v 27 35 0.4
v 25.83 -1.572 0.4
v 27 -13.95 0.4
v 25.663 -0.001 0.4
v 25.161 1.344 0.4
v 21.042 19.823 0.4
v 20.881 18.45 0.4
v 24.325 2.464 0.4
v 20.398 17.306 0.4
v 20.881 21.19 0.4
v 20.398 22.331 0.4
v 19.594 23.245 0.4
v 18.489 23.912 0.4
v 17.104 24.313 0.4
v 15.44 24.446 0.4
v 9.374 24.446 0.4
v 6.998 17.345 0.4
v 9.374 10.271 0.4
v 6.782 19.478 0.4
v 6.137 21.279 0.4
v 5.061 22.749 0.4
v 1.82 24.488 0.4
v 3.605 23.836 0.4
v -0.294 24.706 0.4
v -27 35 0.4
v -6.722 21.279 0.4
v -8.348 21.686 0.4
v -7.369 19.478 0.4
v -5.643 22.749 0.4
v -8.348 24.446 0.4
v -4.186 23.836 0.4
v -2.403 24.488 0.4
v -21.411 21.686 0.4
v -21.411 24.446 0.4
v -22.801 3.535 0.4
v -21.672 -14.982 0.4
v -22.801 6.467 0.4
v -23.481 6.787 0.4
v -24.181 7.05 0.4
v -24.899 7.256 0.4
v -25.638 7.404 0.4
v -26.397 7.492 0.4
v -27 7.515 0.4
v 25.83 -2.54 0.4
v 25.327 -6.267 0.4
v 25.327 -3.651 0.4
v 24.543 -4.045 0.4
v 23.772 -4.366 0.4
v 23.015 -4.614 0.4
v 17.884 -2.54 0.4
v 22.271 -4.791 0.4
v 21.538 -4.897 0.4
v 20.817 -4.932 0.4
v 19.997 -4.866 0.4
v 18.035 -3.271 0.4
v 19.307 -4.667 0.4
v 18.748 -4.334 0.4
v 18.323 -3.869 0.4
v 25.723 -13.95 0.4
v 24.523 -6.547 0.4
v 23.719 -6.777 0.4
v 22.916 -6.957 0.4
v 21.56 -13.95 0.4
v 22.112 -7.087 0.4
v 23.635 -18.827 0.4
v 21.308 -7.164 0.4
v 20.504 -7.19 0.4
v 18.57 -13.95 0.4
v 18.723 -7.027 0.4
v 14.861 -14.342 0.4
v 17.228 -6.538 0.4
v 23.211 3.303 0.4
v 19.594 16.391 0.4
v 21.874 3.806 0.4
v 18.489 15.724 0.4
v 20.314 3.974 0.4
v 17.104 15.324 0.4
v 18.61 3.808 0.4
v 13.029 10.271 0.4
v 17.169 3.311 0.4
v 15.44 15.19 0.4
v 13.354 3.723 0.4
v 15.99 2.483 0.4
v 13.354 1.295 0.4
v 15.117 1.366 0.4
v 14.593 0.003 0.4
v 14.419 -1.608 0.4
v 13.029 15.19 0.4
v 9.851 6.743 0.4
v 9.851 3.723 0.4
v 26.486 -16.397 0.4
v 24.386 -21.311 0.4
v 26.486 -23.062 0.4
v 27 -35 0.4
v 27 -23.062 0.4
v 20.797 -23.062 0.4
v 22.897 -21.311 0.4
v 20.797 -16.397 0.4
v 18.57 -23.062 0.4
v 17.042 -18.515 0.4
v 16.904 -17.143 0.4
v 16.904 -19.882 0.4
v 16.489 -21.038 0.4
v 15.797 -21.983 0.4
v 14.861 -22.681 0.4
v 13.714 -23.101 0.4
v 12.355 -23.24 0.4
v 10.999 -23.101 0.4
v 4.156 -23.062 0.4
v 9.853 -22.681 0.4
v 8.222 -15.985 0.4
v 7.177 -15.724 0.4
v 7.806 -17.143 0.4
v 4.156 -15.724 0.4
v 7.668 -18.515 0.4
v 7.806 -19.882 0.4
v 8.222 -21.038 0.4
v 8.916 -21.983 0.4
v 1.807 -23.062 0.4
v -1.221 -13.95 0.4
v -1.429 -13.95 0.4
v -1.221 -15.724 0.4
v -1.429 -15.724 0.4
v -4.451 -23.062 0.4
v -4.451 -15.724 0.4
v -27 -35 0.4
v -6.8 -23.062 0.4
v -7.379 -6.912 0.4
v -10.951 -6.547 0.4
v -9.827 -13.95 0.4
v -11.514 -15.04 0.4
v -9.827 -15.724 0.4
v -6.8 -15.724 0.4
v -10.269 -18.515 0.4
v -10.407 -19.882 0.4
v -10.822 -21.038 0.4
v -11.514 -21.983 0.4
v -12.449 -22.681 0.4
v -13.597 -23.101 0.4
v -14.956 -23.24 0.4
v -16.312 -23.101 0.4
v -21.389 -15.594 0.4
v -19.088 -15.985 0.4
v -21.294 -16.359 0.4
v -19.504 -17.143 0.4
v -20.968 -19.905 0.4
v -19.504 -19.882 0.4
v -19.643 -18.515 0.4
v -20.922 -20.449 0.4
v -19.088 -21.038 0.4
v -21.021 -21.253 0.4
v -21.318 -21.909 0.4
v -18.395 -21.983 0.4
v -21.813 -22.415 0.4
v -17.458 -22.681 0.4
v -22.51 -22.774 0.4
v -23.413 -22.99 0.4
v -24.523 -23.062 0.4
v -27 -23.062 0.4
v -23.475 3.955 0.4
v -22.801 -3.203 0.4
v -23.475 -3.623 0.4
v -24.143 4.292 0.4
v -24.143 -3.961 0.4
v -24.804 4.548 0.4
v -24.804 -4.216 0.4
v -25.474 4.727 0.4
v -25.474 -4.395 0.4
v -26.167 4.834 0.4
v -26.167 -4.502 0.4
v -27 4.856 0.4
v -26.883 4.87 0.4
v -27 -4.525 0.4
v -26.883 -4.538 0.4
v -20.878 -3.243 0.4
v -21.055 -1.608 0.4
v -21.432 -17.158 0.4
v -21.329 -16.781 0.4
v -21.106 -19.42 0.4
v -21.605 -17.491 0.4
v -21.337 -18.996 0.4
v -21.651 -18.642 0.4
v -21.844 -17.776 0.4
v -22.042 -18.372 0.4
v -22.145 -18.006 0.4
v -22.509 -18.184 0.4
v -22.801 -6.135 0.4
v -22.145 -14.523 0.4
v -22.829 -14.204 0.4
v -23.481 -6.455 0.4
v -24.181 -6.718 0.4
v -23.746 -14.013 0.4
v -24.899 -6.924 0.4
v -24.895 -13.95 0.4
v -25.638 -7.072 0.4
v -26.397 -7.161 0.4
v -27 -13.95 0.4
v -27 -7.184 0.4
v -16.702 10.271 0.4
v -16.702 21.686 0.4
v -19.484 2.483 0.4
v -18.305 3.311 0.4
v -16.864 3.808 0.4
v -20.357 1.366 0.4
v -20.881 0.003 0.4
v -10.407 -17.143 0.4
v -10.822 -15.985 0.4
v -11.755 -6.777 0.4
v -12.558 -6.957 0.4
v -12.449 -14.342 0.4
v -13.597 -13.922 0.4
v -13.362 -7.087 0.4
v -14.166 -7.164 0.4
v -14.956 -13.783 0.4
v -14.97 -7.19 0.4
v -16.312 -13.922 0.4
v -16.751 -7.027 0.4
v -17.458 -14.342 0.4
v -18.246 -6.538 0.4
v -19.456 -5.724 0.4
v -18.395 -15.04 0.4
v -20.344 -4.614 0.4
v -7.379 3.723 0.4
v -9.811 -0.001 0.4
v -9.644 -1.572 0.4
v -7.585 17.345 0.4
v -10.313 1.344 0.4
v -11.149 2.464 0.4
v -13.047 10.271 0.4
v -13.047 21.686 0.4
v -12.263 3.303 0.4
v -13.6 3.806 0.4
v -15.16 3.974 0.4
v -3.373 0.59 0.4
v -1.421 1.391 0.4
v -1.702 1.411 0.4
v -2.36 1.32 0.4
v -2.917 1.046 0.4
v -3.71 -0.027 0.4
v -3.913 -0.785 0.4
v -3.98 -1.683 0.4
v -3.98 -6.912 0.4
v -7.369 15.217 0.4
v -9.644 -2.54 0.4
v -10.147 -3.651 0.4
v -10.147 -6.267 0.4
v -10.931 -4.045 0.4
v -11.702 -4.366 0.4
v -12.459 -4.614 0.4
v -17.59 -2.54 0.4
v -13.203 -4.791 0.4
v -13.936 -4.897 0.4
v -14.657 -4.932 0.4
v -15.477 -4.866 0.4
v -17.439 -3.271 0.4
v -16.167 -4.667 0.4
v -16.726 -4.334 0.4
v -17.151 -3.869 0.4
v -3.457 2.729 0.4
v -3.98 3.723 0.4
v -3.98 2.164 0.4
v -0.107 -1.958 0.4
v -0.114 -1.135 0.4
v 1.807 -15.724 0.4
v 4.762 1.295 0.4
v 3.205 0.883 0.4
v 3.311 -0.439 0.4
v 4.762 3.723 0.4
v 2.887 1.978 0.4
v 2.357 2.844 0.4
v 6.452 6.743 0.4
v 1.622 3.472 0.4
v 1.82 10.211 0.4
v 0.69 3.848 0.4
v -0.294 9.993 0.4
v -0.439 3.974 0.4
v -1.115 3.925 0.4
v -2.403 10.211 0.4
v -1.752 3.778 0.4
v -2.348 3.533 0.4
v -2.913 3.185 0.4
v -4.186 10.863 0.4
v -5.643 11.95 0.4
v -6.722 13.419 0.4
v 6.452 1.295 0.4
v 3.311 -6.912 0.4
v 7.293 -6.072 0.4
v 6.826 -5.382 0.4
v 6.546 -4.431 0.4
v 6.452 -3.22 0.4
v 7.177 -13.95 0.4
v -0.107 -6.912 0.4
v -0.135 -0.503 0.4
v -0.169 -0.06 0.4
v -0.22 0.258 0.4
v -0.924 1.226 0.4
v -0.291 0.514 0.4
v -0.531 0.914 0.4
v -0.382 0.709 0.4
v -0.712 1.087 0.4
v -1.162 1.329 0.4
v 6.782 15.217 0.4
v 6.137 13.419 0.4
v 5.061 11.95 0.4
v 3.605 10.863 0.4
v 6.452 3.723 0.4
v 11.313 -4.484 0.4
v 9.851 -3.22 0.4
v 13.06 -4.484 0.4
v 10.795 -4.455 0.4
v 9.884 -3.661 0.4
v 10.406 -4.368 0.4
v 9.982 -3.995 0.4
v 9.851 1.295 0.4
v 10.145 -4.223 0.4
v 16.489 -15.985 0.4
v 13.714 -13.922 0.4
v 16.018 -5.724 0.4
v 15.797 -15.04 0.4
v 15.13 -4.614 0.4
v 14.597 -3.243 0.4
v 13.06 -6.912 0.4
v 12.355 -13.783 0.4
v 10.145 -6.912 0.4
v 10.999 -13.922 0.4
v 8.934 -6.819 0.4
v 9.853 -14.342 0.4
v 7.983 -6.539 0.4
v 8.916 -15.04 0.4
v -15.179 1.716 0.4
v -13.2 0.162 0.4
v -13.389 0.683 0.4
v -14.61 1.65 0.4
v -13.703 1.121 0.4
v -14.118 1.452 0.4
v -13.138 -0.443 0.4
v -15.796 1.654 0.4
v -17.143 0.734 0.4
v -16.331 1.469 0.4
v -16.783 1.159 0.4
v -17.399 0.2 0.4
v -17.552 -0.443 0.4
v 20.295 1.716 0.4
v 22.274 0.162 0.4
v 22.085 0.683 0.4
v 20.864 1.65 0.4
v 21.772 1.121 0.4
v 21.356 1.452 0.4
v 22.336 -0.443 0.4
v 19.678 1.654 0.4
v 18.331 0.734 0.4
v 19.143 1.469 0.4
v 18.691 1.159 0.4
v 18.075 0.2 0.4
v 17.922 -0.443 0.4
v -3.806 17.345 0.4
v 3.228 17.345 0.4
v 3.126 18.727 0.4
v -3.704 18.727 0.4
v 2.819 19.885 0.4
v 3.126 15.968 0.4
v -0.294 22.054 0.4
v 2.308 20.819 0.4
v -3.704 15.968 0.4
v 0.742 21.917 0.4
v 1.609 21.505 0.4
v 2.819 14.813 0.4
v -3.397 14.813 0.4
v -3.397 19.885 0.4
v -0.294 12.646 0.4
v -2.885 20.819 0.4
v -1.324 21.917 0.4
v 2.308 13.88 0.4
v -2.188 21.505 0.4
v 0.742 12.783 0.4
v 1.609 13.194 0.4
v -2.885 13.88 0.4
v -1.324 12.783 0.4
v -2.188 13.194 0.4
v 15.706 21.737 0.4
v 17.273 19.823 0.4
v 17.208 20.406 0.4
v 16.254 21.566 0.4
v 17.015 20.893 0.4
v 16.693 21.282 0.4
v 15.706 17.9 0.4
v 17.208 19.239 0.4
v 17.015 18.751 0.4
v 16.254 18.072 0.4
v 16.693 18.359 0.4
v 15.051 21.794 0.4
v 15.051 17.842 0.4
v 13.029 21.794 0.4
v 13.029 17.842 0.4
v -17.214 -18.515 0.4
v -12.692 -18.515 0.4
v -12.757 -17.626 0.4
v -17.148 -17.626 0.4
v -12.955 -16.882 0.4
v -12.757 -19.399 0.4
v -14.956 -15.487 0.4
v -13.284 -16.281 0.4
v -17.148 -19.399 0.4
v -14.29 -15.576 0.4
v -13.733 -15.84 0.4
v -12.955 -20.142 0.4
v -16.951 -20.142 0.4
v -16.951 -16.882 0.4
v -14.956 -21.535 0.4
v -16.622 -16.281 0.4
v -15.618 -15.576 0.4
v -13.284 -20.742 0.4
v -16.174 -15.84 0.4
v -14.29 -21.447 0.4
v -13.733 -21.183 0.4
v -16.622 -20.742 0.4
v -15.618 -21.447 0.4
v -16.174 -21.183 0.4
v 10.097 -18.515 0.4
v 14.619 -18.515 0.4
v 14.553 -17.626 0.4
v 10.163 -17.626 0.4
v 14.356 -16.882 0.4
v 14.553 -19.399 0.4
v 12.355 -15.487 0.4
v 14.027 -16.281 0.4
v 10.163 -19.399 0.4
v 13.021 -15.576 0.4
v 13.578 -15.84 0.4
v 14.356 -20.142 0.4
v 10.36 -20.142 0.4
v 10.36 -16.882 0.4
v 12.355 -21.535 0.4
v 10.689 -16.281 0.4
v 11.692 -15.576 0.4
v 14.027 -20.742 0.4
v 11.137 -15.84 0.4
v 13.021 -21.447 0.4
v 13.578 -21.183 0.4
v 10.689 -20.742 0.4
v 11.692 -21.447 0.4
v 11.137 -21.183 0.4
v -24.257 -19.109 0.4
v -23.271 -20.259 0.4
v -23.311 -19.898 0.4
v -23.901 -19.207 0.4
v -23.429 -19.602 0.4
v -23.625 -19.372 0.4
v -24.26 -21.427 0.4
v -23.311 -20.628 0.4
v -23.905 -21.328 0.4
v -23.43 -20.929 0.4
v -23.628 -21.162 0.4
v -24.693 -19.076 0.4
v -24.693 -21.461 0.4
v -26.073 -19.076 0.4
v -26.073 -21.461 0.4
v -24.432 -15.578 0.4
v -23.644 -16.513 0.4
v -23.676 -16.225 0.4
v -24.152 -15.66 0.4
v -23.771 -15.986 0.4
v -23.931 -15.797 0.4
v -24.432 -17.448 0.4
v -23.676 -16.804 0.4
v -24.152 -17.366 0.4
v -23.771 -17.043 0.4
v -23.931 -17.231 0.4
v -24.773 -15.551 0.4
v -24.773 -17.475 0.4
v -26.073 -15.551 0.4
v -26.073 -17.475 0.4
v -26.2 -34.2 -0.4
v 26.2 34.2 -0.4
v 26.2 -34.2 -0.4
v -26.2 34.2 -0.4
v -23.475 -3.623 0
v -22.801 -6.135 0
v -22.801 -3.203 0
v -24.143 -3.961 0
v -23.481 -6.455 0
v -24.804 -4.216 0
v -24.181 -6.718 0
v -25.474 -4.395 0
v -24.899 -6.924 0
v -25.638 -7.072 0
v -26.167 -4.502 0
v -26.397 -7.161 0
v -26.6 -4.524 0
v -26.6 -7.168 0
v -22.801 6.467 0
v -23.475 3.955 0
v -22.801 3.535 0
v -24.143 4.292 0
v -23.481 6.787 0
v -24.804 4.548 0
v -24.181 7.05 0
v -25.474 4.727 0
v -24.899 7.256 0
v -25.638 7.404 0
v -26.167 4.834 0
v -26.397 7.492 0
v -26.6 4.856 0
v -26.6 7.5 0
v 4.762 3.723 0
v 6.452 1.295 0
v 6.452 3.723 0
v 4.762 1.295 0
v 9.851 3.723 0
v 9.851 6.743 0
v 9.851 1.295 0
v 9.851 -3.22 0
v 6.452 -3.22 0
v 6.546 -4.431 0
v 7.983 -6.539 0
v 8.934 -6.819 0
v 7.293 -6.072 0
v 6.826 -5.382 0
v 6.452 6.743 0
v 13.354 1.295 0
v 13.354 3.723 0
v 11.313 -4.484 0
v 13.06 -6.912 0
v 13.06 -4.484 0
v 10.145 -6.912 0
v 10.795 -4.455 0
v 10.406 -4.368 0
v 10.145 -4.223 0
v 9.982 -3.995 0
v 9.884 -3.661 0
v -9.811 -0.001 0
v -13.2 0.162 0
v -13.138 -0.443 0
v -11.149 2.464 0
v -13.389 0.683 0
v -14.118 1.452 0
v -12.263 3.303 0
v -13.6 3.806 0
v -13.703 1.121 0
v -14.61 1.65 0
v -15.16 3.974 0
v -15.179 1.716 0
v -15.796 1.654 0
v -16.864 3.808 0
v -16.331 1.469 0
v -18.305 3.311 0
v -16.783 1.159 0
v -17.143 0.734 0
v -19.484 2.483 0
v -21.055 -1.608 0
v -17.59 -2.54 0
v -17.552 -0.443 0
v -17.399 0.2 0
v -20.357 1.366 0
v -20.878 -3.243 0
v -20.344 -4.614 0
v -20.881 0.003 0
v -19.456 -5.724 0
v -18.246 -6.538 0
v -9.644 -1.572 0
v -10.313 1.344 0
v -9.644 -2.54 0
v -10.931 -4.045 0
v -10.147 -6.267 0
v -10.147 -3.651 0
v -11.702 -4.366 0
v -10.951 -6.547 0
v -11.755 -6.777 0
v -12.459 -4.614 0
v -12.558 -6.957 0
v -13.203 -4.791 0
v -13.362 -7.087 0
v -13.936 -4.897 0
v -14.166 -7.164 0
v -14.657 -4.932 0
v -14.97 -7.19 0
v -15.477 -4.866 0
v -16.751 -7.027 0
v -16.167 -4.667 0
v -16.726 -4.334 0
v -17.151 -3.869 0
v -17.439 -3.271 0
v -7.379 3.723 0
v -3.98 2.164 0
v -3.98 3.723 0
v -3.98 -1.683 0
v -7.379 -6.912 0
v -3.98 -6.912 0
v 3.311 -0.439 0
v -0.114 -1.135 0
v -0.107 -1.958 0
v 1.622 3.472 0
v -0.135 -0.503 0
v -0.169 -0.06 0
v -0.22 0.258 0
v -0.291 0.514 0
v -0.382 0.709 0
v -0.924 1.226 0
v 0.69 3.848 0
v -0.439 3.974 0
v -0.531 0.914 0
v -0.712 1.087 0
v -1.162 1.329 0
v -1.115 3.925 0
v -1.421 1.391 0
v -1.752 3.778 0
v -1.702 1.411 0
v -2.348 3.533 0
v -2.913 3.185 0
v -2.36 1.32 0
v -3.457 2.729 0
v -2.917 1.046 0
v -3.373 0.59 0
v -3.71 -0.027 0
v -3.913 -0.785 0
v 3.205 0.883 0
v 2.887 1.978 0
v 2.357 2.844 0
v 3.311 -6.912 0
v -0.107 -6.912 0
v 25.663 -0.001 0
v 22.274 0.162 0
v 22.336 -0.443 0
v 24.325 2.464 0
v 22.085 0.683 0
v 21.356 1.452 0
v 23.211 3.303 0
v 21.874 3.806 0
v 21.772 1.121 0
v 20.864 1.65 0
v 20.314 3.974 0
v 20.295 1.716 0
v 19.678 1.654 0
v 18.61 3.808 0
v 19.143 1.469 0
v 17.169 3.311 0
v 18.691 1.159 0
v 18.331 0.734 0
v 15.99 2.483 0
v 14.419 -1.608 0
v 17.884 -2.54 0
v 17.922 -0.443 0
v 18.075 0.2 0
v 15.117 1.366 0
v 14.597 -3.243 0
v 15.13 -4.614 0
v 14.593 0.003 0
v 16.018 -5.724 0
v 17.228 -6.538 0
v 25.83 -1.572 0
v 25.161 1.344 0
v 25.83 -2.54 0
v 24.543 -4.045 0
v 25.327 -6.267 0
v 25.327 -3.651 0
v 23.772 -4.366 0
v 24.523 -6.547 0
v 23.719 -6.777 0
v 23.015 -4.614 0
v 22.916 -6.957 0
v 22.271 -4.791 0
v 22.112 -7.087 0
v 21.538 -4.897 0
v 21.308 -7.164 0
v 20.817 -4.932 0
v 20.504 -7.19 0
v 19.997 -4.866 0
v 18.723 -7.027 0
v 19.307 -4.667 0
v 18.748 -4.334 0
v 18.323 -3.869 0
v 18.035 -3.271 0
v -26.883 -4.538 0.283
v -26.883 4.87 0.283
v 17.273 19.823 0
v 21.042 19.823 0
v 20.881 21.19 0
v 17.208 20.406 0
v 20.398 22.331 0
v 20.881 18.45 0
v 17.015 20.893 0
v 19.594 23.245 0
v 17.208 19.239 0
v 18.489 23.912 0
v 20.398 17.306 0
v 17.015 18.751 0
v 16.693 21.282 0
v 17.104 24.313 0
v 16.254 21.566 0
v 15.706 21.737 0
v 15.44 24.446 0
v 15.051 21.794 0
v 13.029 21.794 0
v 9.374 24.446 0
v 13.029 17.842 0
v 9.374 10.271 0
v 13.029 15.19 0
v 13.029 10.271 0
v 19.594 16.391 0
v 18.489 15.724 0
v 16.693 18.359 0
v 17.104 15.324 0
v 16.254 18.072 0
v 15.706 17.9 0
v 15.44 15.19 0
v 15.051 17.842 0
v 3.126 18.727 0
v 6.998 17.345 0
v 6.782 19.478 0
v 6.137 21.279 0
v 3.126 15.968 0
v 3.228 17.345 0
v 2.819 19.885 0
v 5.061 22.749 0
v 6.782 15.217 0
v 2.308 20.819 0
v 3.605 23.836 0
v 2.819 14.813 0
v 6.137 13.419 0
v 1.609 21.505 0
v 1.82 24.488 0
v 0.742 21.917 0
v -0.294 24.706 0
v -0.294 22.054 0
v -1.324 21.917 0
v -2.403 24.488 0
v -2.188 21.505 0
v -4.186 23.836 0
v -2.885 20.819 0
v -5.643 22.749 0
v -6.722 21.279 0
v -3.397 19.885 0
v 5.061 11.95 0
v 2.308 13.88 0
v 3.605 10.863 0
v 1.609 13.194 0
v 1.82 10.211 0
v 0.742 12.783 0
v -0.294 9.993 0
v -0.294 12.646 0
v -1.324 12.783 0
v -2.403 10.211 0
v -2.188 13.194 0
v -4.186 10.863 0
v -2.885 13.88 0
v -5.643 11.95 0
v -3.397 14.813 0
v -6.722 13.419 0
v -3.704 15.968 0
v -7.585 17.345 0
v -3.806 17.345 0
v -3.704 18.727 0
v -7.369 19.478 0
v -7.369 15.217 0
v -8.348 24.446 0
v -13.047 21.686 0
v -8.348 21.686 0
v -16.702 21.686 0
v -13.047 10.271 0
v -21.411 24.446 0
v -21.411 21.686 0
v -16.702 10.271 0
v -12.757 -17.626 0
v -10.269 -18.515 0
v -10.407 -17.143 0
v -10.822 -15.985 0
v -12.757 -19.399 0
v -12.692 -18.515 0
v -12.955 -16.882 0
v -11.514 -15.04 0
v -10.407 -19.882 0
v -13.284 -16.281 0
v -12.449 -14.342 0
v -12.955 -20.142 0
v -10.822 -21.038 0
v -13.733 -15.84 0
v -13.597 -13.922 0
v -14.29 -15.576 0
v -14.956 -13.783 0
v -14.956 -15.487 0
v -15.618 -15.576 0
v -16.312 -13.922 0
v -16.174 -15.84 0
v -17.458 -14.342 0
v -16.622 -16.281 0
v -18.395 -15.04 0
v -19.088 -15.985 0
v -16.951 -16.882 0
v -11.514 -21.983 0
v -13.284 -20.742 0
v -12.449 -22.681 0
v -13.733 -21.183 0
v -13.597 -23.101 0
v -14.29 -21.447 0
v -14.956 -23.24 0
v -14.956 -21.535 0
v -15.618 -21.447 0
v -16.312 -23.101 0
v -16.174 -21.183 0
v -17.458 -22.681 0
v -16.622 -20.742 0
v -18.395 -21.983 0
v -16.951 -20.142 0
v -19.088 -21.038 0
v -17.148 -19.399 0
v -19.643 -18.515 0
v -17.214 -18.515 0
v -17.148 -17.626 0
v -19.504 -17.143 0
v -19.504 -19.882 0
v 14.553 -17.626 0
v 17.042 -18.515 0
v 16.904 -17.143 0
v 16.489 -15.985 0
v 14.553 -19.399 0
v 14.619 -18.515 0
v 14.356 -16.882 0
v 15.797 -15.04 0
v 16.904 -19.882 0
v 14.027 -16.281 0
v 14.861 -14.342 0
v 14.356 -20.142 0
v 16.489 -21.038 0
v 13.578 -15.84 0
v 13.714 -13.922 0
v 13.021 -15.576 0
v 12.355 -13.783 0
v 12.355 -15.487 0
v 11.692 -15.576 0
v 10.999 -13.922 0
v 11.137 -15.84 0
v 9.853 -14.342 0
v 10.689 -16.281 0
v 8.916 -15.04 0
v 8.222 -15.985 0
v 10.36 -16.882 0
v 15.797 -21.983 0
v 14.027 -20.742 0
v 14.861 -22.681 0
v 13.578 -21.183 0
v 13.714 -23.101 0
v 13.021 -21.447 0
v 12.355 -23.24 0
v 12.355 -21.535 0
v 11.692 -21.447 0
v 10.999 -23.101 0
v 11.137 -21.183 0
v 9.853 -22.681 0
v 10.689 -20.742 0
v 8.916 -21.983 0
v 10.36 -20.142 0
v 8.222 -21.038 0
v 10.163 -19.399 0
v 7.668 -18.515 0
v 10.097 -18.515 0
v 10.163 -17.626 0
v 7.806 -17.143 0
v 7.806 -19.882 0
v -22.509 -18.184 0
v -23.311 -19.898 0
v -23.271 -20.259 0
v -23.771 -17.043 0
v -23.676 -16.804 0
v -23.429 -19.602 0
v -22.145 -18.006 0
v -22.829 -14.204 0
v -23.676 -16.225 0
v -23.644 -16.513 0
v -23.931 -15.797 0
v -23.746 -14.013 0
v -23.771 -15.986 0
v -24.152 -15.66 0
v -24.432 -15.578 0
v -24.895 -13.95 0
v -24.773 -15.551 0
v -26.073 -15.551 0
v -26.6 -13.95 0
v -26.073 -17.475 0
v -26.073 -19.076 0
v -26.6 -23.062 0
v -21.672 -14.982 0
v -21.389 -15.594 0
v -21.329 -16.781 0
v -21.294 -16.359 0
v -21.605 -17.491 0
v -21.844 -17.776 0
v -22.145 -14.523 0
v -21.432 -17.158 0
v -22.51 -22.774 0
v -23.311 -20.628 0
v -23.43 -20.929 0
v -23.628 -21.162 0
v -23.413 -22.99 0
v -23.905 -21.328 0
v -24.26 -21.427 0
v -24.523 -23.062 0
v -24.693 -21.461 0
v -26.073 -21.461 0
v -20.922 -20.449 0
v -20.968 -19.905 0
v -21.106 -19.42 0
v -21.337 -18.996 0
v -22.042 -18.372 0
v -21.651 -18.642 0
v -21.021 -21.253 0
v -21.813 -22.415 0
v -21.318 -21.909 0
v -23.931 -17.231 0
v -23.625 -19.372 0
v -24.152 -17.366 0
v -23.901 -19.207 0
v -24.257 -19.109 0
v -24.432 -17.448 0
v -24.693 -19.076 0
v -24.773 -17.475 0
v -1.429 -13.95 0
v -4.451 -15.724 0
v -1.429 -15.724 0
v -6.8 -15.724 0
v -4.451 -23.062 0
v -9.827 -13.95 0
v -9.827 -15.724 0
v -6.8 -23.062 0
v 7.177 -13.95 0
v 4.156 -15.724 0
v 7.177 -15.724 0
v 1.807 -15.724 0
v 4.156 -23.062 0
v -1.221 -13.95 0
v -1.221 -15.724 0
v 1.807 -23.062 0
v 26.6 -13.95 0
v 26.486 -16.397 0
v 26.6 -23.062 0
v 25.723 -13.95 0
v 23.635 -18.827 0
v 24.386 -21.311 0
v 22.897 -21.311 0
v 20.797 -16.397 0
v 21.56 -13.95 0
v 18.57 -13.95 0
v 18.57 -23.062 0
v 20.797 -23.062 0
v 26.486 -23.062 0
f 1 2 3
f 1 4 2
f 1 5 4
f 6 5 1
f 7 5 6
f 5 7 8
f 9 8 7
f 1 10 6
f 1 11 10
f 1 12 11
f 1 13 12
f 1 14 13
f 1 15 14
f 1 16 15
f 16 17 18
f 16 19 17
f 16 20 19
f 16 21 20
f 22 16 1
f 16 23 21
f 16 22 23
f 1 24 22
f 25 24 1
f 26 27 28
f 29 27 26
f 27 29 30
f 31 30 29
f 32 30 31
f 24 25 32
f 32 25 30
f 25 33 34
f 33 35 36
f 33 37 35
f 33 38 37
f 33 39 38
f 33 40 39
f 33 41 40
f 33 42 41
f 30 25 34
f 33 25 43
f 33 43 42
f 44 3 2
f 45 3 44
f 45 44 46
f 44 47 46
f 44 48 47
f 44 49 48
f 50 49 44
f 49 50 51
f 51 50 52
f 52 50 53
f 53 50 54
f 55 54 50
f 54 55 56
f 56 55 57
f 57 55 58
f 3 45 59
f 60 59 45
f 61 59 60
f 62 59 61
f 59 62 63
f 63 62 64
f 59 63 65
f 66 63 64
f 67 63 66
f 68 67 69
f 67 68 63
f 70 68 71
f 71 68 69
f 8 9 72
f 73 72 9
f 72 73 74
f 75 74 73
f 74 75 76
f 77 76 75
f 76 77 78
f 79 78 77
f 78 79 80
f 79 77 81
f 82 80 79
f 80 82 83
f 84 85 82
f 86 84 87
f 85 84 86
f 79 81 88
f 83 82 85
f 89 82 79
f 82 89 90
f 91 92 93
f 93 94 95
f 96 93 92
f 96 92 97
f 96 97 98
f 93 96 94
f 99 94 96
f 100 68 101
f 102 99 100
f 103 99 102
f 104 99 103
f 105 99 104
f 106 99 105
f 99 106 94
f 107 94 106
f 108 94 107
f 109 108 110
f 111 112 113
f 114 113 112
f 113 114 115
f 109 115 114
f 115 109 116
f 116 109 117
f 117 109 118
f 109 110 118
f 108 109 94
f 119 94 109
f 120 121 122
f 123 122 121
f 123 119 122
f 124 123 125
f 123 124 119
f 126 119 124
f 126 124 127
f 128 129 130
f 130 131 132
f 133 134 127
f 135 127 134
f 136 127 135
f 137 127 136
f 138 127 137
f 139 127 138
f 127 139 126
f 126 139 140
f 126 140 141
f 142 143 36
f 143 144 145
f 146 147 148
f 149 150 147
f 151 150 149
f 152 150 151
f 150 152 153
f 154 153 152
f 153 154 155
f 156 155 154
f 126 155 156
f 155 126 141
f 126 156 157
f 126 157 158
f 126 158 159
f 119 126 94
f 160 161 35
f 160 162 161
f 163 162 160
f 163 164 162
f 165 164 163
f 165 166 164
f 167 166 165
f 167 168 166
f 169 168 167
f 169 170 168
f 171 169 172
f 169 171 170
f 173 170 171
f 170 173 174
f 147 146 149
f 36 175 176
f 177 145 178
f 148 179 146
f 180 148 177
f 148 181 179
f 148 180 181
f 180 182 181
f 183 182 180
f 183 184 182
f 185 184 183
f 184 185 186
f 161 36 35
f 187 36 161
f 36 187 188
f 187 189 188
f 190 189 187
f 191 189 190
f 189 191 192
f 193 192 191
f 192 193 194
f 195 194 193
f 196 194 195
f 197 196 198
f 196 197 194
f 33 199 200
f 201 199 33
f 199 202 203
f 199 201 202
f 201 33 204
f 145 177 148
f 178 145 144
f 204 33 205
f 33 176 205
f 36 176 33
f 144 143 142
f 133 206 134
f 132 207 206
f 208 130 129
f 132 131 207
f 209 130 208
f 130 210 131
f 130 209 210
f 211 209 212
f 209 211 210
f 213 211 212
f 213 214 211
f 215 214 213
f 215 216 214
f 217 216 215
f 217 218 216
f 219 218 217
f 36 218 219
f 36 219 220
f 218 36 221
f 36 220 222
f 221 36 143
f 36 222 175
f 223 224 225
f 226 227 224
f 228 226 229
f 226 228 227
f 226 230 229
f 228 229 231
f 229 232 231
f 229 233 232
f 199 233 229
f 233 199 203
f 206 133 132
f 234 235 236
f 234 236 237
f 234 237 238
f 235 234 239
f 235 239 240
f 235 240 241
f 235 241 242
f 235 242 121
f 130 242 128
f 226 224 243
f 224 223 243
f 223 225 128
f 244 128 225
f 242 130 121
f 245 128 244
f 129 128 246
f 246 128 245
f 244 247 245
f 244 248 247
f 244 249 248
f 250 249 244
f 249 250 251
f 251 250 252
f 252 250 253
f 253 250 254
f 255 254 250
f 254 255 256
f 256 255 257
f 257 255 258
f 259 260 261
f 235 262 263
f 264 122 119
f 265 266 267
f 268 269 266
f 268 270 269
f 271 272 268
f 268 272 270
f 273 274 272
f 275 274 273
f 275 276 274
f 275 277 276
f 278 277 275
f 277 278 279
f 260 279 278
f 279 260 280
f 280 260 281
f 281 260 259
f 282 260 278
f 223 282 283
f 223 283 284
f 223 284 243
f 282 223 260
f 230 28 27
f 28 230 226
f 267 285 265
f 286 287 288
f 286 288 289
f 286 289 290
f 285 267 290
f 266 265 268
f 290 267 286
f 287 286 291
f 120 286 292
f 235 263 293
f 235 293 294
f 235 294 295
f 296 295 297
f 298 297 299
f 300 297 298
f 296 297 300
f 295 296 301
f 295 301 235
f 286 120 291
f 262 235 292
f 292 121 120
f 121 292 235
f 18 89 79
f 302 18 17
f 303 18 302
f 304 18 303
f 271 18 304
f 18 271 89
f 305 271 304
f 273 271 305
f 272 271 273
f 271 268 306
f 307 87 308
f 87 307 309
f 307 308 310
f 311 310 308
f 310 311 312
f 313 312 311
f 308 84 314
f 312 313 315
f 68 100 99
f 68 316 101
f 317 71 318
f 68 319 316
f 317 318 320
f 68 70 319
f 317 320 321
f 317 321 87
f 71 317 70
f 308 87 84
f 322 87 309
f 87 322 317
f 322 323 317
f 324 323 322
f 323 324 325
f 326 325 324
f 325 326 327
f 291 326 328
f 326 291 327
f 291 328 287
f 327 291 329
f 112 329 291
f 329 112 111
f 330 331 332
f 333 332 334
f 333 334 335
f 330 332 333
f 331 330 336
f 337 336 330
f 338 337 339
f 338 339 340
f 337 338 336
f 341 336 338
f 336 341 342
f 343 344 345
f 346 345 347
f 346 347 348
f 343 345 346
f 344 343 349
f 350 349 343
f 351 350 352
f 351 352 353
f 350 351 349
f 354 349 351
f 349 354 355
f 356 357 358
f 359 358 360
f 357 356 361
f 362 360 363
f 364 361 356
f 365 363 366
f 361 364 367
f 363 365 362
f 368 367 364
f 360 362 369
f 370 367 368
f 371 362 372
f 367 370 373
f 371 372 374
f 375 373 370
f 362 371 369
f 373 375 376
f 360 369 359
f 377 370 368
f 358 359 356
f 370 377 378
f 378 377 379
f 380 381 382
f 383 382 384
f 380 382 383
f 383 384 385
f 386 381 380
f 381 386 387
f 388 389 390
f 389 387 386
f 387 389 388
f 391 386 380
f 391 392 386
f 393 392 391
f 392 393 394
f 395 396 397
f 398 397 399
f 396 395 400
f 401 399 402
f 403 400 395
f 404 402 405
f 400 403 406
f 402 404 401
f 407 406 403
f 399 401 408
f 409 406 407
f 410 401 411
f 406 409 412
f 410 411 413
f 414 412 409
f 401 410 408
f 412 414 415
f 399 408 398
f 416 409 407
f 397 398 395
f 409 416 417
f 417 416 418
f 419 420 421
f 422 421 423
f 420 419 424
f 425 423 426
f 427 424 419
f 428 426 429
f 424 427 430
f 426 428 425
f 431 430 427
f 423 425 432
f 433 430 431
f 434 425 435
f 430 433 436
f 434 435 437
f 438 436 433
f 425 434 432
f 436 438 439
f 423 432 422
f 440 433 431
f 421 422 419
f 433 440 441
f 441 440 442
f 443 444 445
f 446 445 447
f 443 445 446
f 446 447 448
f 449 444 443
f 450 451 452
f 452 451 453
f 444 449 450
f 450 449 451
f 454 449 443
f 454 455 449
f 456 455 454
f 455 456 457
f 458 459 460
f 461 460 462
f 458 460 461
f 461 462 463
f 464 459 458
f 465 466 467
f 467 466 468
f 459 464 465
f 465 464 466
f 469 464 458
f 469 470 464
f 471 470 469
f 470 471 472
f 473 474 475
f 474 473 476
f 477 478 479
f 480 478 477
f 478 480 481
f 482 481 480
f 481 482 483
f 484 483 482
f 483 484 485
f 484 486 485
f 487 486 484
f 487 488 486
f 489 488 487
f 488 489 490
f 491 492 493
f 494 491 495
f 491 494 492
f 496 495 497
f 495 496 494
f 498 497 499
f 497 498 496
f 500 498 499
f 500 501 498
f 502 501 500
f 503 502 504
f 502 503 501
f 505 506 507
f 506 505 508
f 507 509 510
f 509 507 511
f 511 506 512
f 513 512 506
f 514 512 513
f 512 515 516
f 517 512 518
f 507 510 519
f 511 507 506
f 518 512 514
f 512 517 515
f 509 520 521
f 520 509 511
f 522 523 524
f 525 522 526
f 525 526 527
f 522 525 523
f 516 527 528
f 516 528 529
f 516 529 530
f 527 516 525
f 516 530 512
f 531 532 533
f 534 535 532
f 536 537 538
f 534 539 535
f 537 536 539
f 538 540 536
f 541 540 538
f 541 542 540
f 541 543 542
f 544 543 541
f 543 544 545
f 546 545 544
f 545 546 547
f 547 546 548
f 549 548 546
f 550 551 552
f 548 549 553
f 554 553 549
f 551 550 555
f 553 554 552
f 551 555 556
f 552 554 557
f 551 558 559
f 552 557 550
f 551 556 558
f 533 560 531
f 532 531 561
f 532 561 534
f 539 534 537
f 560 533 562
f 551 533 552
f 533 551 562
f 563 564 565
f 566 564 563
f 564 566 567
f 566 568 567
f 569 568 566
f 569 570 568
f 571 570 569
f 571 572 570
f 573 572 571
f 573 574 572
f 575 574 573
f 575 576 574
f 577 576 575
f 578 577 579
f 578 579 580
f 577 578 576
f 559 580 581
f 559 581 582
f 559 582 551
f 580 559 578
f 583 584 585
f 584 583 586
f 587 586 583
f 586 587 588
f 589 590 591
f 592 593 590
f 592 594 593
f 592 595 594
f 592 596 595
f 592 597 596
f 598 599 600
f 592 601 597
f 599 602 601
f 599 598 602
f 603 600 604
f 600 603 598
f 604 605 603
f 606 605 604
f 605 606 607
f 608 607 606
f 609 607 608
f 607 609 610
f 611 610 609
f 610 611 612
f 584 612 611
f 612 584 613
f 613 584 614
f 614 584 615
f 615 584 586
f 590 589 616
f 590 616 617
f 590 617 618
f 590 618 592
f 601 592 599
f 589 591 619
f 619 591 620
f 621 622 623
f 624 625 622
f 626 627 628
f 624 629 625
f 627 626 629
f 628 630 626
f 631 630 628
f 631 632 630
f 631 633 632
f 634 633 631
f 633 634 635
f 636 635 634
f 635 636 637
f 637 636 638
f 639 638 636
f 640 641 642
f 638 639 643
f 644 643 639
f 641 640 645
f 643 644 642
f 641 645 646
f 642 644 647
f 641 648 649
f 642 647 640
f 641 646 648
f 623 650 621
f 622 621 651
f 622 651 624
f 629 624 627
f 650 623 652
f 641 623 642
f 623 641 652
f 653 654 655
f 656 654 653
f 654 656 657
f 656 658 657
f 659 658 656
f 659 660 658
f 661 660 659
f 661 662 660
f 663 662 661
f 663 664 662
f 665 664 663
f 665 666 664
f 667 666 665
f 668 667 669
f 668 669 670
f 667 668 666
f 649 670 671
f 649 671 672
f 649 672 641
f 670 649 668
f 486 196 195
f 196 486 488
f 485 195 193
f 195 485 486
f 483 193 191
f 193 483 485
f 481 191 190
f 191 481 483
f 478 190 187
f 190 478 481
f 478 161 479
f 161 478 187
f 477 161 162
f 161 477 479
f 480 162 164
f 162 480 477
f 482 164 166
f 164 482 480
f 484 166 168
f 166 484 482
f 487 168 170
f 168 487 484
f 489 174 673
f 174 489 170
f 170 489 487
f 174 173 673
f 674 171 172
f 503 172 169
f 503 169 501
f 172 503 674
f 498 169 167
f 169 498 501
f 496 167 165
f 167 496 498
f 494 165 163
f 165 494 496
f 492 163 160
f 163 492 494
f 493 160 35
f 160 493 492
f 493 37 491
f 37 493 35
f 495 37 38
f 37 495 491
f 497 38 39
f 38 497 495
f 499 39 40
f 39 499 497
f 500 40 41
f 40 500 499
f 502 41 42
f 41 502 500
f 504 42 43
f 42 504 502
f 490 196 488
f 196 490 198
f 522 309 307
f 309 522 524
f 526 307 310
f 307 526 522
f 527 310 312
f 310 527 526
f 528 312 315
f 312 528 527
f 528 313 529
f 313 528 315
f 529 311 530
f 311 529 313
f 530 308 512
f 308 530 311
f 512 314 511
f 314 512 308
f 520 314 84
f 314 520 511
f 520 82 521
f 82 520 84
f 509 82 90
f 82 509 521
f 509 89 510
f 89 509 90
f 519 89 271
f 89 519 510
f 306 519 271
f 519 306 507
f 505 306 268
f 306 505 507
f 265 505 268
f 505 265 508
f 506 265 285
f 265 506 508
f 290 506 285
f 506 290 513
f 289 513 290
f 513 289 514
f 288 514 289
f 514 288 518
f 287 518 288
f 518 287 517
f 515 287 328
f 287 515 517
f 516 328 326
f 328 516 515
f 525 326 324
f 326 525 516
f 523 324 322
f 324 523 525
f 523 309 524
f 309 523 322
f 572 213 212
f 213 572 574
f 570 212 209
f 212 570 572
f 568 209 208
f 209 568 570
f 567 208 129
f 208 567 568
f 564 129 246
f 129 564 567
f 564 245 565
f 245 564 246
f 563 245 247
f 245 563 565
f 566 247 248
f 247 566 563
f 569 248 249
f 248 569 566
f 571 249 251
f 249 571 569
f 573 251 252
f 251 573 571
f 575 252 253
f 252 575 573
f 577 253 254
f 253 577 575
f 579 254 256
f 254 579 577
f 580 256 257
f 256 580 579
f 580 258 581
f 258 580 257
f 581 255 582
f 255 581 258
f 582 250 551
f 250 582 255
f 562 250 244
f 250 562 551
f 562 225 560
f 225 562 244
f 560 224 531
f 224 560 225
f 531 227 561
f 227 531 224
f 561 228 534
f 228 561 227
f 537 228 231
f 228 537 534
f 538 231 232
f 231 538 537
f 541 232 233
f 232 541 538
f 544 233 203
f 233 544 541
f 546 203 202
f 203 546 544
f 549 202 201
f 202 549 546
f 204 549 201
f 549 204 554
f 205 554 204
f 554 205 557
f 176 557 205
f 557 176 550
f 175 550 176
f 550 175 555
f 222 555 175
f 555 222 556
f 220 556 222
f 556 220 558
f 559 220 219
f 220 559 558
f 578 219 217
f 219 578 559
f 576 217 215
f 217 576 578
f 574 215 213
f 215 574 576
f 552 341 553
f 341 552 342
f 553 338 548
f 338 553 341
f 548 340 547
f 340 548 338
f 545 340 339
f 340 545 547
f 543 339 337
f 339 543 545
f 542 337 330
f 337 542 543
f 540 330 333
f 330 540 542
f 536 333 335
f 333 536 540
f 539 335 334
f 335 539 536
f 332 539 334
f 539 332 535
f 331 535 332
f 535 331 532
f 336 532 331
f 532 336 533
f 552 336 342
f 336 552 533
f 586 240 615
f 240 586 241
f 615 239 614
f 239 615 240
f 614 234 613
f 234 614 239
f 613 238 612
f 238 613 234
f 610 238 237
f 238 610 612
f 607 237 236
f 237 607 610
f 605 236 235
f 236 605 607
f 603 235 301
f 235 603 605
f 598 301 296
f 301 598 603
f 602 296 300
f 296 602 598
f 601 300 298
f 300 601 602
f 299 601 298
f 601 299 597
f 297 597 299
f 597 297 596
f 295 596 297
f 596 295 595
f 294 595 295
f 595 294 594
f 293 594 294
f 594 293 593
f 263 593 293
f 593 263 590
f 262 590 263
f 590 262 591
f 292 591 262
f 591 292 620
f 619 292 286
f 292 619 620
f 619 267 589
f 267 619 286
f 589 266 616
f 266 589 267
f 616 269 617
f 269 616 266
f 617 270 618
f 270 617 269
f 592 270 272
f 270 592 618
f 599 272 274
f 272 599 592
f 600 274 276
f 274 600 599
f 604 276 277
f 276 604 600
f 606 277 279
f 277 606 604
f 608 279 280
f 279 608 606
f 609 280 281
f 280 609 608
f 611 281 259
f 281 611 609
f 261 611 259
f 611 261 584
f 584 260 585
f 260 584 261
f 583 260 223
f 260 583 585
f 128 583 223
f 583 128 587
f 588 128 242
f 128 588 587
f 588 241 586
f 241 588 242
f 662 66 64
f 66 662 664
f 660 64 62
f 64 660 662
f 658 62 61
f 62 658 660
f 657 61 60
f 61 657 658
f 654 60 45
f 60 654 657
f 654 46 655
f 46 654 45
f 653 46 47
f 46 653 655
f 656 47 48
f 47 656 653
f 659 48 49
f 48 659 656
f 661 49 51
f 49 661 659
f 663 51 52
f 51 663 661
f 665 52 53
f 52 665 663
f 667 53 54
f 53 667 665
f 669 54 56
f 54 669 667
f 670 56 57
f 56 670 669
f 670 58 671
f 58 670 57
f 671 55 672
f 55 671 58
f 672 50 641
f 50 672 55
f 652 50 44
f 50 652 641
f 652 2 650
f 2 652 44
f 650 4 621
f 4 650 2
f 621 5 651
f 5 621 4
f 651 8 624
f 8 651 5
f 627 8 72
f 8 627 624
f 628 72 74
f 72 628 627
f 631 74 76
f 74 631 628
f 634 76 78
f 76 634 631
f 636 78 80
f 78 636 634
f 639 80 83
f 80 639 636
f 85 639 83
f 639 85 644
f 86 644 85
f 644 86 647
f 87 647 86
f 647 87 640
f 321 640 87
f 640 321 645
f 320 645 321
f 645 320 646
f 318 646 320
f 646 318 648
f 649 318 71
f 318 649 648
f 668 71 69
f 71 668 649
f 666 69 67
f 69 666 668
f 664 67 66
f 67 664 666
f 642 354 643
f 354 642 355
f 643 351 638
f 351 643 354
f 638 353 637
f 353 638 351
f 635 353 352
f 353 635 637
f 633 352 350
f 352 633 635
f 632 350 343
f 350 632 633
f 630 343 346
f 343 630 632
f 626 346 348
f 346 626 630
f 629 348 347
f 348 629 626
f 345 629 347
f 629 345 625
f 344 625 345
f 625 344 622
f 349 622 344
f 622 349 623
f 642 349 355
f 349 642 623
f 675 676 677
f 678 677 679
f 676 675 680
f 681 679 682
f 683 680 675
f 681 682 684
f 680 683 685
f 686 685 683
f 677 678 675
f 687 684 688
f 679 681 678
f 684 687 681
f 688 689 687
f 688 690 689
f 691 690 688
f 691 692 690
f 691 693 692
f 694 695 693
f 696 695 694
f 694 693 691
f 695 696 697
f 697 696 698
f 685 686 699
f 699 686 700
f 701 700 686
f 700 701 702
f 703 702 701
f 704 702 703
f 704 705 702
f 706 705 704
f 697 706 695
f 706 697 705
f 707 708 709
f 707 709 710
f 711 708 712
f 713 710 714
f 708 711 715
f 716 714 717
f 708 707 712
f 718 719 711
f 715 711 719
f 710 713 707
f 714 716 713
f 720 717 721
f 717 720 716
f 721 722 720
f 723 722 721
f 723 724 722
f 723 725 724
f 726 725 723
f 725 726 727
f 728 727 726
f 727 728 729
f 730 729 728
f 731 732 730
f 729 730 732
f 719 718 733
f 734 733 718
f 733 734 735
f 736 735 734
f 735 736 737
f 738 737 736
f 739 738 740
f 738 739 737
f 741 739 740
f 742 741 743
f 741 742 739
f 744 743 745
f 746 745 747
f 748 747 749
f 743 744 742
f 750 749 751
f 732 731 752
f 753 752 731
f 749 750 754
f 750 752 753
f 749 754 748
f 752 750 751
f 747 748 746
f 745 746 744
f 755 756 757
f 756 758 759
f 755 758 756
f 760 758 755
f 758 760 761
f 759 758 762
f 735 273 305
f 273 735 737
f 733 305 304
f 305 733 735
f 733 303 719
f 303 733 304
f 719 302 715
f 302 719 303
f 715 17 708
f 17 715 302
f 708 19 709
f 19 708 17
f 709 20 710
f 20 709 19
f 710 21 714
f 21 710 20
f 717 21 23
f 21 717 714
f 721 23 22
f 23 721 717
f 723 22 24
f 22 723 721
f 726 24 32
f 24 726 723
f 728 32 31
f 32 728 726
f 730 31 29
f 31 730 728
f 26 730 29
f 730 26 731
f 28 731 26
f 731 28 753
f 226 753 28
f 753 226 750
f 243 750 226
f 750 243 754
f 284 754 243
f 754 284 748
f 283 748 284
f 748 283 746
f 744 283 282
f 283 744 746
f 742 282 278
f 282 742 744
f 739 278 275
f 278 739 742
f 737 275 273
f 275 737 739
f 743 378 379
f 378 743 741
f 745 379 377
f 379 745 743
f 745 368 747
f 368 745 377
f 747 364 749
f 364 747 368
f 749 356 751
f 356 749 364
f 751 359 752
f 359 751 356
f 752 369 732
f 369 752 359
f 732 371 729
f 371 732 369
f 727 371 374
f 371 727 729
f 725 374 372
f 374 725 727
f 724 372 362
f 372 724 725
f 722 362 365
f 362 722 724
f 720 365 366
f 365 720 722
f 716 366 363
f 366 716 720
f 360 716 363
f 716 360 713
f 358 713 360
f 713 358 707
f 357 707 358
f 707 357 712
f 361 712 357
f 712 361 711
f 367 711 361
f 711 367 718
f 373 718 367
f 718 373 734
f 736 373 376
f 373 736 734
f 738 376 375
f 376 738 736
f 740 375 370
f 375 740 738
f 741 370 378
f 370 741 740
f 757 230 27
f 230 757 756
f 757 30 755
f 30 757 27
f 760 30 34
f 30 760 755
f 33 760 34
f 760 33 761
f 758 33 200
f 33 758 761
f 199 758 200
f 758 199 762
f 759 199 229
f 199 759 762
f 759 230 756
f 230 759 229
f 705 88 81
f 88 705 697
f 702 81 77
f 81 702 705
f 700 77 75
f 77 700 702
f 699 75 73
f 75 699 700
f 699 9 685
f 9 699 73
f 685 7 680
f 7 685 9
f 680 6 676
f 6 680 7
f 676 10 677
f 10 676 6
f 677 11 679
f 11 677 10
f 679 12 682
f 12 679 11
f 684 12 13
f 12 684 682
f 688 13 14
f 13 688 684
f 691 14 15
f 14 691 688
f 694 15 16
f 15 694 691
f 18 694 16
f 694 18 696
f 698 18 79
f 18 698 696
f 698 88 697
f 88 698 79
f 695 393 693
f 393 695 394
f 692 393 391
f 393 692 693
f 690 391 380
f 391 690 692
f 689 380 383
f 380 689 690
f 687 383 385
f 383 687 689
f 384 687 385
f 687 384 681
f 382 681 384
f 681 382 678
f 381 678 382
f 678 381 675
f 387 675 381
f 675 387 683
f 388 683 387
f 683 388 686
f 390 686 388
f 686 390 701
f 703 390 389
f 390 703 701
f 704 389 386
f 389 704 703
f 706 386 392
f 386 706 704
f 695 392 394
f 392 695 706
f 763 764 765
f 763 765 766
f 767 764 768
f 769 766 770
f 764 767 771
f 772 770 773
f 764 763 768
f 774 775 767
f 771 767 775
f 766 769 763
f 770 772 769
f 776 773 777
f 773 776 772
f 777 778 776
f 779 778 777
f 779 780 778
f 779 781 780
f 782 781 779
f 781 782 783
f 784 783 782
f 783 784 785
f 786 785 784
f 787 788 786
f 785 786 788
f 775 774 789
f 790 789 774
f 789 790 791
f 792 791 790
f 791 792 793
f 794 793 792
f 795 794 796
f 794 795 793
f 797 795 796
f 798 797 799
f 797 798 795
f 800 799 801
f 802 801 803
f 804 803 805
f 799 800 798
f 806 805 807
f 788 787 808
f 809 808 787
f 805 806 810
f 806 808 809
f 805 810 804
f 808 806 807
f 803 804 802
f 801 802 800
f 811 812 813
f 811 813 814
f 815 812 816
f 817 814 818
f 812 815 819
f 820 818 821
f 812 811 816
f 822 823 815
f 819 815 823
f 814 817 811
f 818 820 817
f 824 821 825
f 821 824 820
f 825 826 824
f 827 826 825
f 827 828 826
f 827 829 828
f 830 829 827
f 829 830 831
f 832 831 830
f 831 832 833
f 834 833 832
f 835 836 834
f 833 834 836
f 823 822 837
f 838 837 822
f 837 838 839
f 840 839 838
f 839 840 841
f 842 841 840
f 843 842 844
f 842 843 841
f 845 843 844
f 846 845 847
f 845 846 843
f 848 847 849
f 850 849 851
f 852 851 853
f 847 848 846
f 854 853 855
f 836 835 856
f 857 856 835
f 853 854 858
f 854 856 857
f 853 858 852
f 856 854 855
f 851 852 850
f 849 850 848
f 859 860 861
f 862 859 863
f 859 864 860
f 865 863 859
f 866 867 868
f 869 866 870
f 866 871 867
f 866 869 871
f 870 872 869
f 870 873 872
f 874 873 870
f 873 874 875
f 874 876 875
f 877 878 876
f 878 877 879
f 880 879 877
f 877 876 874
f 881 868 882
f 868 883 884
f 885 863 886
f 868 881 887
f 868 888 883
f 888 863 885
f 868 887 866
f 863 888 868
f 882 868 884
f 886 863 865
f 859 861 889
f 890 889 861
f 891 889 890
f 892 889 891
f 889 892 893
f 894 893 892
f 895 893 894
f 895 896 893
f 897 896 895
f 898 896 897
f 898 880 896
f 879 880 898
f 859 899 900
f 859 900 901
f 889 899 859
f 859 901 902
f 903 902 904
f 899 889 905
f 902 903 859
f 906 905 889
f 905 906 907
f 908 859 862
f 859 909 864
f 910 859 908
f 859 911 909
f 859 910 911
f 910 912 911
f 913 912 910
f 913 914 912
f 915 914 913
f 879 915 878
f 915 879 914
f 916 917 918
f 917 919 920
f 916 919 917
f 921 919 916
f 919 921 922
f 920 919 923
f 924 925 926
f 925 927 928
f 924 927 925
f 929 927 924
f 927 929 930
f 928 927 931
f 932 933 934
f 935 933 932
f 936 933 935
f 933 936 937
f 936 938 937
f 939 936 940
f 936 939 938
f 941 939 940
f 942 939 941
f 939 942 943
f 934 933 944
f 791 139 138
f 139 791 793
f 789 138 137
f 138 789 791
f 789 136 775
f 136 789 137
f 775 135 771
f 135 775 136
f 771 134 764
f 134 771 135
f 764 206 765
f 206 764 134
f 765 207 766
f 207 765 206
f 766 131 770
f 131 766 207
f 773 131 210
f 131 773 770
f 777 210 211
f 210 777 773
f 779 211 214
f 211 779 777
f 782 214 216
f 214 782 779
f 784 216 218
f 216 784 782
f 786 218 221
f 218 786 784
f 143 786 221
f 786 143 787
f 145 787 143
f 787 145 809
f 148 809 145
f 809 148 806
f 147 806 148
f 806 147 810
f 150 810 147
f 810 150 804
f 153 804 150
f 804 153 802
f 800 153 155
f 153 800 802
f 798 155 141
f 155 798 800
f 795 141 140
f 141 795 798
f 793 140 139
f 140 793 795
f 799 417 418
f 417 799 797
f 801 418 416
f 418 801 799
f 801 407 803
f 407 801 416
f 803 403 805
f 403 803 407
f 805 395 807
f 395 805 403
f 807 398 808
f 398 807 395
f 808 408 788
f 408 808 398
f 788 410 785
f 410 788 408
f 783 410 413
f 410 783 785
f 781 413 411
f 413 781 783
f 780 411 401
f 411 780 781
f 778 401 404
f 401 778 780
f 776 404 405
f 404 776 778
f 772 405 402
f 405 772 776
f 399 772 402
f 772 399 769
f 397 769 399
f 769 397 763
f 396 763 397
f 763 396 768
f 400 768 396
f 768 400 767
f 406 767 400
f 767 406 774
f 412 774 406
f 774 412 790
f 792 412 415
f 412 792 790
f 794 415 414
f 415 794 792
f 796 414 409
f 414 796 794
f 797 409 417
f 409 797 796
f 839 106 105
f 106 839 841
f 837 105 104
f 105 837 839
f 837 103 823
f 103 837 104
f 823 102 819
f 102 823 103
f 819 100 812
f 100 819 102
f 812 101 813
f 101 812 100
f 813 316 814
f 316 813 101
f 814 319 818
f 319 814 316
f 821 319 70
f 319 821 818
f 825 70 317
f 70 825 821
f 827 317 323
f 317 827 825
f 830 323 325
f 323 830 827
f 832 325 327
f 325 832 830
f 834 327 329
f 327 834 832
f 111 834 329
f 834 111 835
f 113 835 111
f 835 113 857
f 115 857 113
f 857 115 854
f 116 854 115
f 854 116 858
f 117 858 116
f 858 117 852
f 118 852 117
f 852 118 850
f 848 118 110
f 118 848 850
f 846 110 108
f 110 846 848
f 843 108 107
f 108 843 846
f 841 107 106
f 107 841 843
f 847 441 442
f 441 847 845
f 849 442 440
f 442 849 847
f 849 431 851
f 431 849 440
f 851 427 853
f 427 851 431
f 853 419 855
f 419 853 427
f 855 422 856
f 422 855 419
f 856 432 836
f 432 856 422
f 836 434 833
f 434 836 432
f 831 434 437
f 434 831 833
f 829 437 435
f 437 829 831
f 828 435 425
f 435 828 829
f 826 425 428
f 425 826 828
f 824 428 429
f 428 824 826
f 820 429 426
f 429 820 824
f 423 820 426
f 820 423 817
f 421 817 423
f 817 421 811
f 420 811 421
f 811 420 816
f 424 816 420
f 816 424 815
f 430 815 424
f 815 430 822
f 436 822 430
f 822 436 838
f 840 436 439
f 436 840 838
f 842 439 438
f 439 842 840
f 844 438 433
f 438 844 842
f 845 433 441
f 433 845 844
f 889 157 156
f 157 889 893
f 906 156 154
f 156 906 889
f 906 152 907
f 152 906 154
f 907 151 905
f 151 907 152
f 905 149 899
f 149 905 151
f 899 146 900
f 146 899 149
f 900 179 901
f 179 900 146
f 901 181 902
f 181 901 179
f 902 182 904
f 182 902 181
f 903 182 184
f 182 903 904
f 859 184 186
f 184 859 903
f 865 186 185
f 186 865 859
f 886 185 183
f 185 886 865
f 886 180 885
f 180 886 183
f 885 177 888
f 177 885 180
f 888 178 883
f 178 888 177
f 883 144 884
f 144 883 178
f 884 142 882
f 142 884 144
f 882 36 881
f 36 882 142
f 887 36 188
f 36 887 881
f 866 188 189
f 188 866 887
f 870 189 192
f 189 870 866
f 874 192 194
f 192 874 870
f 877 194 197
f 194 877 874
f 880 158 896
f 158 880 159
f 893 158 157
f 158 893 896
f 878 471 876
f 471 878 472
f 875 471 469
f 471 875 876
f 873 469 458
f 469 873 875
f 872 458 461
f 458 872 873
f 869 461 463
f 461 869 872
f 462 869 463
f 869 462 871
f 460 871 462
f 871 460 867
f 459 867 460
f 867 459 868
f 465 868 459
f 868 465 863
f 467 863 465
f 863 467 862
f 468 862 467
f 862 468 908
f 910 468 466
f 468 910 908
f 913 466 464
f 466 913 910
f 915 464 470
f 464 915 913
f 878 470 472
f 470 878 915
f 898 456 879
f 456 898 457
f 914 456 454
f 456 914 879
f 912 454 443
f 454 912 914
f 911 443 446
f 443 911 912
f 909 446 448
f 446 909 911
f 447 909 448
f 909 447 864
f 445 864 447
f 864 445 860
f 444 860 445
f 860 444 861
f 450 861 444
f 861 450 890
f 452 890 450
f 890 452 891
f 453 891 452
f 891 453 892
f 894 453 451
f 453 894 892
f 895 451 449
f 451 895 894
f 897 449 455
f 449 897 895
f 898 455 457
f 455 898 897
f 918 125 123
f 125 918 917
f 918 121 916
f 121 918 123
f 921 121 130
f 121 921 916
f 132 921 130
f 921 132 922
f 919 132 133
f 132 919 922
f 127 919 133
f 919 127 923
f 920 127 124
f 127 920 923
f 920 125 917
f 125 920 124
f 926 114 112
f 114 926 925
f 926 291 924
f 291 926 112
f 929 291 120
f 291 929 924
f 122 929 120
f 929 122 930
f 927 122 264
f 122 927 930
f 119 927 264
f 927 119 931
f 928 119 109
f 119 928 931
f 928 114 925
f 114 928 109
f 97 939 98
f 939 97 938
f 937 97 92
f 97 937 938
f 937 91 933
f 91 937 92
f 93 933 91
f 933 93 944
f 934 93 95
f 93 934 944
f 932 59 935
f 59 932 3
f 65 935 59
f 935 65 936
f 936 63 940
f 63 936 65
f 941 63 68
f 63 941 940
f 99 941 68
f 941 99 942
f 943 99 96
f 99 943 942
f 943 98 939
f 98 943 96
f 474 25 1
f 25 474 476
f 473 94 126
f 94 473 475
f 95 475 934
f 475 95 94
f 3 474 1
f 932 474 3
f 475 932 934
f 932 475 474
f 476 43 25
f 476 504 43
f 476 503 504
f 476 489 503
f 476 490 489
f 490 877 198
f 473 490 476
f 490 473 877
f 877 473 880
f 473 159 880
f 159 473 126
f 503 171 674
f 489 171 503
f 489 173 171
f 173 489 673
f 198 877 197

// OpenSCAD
//Book Hide (Small)

//Text here appears on the top
text_top = "TOP";
//Size of the top text
size_top = 14;//[2:1:20]
//Vertical position of top text
top_position = 10;//[0:1:24]

//Text here appears on the center
text_center = "Center";
//Size of the center text
size_center = 14;//[2:1:20]

//Text here appears on the bottom
text_bottom = "BOTTOM";
//Size of the bottom text
size_bottom = 9;//[2:1:20]
//Vertical position of bottom text
bottom_position = -14;//[-26:1:0]

//Font. Type in the font name
font_family = "Pristina";
// Font weight. bold/italic/light
font_weight = "bold";

//Resolution. 
resolution = 20;//[10:10:100]

difference () {
    
translate([0,0,0])
cube([54,70,0.8],center=true);
linear_extrude(height=0.4) {
text(
    text_center,
    font = str(font_family, ":style=", font_weight),
    size=size_center,
    halign="center",
    valign="center");
}
translate ([0,top_position,0])
linear_extrude(height=0.4) {
text(
    text_top,
    font = str(font_family, ":style=", font_weight),
    size=size_top,
    halign="center",
    valign="bottom");
}
translate ([0,bottom_position,0])
linear_extrude(height=0.4) {
text(
    text_bottom,
    font = str(font_family, ":style=", font_weight),
    size=size_bottom,
    halign="center",
    valign="top");
}
translate([0,41.271,-0.4]) rotate([45,0,0]){
cube([54,10,10],center=true);
}
translate([0,-41.271,-0.4]) rotate([45,0,0]){
cube([54,10,10],center=true);
}
translate([33.271,0,-0.4]) rotate([0,45,0]){
cube([10,70,10],center=true);
}
translate([-33.271,0,-0.4]) rotate([0,45,0]){
cube([10,70,10],center=true);
}
}
$fn=resolution;
